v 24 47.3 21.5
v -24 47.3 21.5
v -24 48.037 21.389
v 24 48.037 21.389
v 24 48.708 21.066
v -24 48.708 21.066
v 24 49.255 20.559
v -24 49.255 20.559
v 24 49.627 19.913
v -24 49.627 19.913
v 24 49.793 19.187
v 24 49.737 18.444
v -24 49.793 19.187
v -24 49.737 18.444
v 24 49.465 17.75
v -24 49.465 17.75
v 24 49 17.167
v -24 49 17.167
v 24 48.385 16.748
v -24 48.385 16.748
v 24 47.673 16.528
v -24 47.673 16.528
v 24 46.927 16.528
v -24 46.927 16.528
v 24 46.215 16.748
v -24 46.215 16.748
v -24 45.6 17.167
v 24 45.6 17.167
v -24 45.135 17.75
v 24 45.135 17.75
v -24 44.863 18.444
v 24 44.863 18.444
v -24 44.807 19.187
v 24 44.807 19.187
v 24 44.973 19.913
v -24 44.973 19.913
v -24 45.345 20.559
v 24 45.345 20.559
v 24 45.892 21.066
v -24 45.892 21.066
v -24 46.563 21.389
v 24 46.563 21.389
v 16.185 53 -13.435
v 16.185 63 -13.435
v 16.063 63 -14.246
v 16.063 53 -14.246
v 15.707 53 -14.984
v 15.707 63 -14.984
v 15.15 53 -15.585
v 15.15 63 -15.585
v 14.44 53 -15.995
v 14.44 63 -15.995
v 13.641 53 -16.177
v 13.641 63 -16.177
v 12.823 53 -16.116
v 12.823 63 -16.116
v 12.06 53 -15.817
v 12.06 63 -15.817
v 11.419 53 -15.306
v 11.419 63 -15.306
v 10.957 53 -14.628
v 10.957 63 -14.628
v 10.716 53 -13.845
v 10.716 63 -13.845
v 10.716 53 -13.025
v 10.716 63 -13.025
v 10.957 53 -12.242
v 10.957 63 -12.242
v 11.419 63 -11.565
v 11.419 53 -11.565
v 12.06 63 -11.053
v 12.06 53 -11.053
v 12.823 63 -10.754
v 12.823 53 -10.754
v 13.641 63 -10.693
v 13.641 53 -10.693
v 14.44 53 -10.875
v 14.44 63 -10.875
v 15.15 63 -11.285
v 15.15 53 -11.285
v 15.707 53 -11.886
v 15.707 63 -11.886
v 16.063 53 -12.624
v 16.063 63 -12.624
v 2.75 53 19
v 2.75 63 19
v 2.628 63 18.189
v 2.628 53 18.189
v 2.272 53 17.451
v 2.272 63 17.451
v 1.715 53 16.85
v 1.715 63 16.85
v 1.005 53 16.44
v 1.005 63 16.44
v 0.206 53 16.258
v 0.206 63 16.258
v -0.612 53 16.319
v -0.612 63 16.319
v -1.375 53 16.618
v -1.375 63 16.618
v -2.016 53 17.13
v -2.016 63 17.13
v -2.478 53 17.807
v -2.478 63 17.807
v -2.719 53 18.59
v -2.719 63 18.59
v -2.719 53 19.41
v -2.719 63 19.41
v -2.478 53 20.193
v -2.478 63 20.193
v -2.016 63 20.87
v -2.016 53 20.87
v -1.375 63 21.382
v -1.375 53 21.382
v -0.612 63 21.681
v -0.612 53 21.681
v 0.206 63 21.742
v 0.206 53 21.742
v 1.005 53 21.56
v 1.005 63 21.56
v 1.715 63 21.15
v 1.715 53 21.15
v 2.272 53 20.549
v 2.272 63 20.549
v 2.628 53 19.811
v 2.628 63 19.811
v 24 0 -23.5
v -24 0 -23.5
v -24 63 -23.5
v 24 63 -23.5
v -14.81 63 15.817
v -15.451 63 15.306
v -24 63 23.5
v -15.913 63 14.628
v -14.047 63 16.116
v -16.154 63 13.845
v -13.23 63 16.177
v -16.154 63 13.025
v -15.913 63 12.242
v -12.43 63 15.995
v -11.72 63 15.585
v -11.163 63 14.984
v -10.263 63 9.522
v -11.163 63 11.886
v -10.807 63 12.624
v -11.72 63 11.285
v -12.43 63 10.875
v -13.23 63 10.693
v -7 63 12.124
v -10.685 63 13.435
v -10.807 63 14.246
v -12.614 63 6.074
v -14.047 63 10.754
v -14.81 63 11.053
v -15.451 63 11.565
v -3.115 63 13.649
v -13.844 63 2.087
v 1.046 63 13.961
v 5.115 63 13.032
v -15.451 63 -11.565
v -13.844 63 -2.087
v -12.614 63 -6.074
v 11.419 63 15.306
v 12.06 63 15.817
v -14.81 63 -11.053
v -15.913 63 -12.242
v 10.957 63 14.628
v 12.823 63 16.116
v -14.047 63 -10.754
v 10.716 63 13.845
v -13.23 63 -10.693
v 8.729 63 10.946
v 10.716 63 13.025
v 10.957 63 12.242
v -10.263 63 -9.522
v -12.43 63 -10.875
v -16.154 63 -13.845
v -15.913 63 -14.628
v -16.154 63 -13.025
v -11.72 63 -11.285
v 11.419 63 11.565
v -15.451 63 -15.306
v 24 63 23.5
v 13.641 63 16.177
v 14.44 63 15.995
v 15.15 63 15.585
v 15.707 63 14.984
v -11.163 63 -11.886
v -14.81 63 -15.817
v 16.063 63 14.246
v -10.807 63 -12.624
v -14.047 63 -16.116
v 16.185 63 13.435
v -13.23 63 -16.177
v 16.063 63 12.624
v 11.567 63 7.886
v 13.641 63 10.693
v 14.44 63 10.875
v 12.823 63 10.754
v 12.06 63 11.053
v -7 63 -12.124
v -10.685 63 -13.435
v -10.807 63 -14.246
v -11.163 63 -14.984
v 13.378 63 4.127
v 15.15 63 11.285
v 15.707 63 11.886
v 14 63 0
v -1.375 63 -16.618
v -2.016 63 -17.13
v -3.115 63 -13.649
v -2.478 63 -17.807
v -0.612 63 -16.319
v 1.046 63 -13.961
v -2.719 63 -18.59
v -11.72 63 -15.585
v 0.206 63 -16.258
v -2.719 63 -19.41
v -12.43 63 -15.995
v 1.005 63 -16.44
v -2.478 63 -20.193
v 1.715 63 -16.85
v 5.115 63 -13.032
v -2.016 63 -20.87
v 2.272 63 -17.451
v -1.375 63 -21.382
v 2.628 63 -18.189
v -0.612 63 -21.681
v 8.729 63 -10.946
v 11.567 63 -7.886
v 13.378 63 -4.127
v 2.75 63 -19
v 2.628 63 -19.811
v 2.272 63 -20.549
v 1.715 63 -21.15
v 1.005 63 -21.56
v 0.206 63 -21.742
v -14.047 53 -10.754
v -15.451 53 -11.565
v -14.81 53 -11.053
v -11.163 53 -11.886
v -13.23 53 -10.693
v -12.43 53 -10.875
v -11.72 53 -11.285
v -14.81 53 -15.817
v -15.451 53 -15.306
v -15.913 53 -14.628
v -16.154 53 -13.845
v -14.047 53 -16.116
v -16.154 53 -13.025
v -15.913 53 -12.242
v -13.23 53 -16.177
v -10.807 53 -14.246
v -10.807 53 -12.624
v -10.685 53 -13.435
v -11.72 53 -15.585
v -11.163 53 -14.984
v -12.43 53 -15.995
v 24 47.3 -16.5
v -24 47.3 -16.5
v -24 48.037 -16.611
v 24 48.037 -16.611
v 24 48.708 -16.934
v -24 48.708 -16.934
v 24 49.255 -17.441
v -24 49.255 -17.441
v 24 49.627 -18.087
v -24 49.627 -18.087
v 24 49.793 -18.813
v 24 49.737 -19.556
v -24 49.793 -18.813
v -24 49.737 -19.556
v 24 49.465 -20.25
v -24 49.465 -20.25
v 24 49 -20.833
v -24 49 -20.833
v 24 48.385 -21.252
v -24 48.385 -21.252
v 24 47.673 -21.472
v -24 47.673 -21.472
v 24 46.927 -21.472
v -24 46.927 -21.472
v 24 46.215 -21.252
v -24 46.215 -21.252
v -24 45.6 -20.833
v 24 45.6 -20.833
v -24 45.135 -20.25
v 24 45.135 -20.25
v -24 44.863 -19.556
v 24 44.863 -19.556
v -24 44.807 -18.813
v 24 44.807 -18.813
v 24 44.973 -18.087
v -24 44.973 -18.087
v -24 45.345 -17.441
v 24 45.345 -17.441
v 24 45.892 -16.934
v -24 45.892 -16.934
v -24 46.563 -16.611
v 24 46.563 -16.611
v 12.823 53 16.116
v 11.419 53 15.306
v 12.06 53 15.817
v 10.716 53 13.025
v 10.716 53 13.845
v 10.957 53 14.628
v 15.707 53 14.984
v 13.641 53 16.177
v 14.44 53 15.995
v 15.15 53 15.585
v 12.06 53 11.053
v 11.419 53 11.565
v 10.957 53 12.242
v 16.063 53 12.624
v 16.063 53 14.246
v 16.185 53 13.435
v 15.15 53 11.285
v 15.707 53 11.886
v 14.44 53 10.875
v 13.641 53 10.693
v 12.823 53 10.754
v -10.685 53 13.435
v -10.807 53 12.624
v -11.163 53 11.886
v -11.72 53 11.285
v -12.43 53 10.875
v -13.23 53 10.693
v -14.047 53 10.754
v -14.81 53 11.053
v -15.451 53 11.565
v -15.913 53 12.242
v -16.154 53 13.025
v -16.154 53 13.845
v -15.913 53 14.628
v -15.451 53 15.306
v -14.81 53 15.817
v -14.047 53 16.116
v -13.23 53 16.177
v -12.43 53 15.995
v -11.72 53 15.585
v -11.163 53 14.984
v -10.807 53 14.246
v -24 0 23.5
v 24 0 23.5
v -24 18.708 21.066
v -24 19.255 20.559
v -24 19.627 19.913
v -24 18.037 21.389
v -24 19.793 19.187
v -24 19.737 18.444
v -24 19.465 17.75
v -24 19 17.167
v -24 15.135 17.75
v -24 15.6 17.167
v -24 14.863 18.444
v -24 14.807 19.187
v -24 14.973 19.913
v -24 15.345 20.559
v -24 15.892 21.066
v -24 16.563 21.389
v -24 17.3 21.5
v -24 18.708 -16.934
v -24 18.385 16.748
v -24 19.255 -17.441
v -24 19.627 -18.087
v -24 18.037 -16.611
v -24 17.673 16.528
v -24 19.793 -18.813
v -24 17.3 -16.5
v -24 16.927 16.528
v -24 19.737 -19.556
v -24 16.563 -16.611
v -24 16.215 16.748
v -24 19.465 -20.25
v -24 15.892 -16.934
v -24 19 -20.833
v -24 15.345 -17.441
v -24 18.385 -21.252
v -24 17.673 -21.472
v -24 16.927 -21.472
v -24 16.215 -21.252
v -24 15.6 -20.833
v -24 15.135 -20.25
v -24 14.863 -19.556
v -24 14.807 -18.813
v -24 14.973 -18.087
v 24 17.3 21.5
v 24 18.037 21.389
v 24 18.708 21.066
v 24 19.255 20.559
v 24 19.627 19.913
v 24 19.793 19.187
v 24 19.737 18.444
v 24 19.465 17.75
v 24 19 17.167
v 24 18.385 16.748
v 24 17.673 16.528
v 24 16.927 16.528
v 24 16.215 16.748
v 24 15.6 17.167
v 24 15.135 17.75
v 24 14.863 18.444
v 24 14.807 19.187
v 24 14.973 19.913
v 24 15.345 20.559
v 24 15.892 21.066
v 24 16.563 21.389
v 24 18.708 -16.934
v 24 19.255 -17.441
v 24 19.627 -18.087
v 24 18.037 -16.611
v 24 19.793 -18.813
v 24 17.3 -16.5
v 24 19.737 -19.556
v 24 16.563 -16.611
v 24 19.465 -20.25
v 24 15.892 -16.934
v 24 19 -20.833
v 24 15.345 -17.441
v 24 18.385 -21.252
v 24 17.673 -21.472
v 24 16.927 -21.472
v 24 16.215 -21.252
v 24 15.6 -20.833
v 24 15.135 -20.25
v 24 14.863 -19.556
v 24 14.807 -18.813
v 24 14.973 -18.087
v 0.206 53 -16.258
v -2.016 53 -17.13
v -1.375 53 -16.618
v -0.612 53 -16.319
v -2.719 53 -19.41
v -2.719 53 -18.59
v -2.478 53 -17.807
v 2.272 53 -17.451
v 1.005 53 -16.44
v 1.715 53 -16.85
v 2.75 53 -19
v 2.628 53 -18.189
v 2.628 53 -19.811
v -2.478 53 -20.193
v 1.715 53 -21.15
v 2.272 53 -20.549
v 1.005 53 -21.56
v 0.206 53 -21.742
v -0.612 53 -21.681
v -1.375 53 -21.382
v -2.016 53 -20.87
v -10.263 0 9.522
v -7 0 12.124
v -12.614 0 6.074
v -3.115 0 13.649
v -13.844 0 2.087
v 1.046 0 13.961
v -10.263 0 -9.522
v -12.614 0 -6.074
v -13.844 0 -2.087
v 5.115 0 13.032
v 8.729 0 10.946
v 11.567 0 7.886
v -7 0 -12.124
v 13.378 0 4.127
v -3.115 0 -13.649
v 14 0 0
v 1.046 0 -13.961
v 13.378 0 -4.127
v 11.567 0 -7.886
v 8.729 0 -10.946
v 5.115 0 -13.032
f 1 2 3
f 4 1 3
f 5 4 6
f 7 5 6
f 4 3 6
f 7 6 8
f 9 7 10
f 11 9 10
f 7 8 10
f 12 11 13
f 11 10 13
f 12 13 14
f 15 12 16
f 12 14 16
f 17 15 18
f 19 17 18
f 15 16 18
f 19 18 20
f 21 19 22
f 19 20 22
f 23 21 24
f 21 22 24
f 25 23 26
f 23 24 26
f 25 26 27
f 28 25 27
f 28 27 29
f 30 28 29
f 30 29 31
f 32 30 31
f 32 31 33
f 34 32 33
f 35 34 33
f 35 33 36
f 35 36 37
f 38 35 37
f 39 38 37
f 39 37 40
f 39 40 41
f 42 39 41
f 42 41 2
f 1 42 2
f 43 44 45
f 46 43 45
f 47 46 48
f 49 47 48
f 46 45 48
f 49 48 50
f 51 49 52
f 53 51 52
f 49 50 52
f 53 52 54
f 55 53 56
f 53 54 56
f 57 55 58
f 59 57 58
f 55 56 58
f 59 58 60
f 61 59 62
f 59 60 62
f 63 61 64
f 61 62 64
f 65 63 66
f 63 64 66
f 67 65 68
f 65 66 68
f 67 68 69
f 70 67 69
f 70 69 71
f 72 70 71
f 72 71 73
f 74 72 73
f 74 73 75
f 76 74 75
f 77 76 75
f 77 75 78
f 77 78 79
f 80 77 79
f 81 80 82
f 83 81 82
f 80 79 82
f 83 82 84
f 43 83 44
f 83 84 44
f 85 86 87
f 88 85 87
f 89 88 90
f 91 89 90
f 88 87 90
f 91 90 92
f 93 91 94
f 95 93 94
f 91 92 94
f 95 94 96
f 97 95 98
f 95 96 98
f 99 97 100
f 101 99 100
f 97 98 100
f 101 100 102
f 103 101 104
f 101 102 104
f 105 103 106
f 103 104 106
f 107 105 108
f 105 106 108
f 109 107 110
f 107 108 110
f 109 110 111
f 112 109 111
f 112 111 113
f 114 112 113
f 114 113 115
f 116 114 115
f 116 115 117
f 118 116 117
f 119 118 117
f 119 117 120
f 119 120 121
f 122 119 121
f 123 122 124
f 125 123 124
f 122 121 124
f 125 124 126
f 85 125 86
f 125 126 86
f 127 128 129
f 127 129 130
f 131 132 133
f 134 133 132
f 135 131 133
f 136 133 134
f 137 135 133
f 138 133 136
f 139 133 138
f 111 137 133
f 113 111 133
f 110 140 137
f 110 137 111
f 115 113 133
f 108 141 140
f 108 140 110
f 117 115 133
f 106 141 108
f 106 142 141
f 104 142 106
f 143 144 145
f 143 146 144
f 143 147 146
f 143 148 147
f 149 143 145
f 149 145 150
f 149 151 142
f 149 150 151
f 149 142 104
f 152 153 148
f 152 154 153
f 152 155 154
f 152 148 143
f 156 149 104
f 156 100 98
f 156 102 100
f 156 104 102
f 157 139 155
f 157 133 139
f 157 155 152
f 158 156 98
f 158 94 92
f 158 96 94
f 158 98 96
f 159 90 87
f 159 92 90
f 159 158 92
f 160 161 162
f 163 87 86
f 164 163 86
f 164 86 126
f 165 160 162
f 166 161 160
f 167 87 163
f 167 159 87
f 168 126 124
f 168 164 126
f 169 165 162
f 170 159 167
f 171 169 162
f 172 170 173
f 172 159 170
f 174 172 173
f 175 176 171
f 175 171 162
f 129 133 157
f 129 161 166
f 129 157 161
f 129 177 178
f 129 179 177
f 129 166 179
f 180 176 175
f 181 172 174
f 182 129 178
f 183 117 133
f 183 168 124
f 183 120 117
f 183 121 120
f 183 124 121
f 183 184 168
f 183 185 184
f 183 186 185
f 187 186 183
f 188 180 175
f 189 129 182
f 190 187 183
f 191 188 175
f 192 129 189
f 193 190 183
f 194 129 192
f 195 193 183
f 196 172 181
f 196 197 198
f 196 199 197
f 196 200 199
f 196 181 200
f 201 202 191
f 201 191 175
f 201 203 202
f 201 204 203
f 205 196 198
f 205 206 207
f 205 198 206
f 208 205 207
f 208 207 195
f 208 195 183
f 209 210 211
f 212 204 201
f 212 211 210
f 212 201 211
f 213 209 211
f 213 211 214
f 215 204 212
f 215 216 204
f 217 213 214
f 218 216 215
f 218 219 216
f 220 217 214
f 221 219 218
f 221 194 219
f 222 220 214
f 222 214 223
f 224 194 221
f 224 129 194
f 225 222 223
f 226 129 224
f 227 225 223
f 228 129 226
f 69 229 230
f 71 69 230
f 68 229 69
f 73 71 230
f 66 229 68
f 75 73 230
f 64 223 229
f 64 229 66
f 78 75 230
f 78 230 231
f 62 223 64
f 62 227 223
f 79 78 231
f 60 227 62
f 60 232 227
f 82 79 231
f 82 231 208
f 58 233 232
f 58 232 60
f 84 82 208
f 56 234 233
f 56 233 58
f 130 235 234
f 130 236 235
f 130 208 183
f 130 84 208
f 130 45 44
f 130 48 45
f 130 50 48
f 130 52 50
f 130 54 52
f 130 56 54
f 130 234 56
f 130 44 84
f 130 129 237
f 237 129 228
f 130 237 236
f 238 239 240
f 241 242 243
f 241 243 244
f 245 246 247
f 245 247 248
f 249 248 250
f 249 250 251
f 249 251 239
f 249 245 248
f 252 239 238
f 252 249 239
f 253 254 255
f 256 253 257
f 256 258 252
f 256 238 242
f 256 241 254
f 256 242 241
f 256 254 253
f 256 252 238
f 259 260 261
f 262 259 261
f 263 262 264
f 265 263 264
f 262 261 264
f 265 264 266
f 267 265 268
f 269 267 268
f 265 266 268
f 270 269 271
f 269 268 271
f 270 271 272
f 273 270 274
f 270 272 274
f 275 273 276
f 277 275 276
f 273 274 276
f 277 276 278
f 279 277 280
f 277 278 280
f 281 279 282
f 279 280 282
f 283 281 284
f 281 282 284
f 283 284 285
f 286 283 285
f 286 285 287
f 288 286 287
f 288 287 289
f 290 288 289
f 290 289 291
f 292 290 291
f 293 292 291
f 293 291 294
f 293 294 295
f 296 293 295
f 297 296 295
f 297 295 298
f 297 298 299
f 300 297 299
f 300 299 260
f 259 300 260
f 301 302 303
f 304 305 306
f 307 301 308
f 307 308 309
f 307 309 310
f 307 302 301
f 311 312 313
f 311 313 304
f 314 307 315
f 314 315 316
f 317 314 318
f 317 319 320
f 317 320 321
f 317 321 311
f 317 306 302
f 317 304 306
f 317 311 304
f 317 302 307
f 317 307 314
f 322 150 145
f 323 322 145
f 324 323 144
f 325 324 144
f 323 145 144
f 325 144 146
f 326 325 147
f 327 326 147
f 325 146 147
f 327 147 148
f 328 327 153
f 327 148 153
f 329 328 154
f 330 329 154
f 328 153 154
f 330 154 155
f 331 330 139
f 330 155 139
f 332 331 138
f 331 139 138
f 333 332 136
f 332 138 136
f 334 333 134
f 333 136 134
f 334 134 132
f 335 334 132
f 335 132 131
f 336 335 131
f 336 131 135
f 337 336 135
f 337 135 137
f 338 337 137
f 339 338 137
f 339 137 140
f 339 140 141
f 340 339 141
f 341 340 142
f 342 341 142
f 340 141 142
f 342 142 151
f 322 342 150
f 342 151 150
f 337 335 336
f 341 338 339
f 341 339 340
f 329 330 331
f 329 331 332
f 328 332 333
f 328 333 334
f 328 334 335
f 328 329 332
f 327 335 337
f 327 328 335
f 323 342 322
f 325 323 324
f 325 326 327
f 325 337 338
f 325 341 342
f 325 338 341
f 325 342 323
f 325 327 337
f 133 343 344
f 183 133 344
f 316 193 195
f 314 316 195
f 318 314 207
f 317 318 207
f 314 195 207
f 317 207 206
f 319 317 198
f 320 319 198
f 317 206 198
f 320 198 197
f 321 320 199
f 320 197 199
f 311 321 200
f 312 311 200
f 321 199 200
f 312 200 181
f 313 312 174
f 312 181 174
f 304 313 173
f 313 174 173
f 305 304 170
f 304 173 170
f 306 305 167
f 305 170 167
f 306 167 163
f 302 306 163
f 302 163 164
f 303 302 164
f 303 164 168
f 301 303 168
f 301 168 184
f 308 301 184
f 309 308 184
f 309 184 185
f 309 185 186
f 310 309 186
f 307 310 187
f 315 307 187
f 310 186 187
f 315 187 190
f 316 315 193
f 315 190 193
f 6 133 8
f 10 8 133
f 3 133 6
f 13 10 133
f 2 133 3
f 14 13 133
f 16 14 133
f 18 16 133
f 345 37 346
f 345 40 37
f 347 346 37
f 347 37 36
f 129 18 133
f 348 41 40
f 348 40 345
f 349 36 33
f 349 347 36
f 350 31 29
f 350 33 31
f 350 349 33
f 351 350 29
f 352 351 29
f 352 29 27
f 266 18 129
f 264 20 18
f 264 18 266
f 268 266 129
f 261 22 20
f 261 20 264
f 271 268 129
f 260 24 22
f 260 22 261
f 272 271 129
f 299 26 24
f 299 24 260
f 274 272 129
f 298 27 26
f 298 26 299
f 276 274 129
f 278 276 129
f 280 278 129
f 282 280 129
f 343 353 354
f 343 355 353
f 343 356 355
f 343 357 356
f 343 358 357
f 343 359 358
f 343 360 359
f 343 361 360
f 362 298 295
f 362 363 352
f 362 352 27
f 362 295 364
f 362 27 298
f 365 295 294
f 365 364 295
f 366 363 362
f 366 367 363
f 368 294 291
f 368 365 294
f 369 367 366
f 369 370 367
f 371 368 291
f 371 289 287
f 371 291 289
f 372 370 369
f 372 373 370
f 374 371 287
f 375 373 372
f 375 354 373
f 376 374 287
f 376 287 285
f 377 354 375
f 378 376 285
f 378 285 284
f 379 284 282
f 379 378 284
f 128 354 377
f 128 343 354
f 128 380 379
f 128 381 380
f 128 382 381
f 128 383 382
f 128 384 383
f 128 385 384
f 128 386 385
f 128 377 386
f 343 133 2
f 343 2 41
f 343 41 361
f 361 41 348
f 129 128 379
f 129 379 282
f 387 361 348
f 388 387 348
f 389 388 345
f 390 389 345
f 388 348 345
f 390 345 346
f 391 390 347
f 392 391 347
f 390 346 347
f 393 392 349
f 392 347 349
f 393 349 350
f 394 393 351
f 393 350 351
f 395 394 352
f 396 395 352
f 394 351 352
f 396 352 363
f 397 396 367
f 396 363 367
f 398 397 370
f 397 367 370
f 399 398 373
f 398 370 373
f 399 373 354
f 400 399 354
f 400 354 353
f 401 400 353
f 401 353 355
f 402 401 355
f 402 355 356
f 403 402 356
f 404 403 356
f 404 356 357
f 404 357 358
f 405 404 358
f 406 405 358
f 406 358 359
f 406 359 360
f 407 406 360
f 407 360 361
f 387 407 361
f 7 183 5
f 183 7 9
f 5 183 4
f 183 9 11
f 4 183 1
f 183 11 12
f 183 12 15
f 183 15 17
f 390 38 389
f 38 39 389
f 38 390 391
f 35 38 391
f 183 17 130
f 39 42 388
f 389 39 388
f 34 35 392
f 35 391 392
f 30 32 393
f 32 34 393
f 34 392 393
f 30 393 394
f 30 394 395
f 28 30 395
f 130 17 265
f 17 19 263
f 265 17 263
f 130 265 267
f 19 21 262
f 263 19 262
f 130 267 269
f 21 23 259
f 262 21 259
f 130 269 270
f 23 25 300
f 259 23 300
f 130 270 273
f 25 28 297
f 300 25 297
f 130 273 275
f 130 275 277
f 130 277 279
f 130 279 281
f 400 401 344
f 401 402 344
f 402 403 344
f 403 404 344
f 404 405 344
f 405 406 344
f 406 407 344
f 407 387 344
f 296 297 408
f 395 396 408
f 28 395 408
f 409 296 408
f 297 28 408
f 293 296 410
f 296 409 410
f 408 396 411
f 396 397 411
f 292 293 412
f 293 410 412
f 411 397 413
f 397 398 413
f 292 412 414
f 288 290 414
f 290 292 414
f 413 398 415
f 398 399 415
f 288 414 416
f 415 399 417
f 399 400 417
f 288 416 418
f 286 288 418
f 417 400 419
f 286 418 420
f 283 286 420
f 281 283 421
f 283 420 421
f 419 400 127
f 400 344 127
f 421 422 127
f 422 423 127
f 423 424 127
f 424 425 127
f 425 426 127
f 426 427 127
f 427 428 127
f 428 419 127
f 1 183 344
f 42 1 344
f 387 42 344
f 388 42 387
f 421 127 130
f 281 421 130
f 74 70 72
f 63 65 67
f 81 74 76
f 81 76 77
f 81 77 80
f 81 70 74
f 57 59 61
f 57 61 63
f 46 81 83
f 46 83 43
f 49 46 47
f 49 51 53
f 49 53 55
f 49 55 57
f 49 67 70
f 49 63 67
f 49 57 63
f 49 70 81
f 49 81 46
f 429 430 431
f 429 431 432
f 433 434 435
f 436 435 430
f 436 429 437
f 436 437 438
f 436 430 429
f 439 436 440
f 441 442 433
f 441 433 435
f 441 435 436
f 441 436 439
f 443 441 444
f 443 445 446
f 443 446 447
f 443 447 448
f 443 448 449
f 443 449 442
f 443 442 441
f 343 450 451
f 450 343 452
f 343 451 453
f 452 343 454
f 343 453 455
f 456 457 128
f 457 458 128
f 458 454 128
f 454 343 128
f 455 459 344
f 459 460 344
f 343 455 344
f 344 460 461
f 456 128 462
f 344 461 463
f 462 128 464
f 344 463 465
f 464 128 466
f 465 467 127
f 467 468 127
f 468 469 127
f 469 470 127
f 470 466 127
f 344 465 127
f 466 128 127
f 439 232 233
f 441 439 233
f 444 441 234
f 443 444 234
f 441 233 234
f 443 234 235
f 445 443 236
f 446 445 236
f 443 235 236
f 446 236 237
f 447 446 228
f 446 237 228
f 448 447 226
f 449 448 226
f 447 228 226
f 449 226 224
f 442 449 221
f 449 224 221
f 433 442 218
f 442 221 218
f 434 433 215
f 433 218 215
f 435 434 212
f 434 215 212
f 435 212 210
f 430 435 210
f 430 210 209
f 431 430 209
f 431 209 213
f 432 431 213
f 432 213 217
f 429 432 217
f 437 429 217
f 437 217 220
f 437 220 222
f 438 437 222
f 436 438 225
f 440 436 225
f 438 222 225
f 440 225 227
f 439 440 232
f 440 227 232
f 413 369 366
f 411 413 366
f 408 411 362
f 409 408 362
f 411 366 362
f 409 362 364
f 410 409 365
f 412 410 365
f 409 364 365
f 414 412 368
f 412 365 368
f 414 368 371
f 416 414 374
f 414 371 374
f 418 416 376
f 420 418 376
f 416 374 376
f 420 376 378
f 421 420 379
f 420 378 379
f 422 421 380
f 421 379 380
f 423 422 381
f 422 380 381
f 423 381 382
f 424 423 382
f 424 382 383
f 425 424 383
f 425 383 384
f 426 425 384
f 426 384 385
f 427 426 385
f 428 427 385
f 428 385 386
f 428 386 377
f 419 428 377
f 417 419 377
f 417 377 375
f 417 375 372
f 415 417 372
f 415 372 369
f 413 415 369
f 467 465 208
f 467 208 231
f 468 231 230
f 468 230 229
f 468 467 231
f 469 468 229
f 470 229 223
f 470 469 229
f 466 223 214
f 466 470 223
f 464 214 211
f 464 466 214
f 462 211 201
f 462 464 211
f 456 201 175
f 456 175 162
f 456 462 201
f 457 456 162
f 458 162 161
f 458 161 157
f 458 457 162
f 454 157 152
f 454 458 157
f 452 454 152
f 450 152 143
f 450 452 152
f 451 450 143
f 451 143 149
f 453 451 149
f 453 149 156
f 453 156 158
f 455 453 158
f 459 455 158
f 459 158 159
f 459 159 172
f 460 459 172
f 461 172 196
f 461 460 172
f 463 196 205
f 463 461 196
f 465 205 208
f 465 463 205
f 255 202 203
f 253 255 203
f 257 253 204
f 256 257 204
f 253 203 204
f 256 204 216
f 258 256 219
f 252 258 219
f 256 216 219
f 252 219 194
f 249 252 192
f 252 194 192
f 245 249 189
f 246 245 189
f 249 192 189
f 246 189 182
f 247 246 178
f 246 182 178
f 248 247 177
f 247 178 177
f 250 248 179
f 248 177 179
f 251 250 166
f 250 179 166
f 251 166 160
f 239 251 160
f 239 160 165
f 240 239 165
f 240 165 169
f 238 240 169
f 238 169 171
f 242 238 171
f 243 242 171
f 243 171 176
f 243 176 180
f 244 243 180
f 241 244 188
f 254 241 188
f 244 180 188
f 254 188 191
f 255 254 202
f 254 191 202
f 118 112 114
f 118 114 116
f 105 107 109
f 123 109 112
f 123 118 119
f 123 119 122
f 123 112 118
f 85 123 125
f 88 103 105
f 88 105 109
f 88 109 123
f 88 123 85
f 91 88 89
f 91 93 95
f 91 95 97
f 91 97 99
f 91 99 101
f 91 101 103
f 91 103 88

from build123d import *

# Parameters (mm, degrees)
SKETCH_1_W          = 48
SKETCH_1_H          = 47
SKETCH_1_R          = 14
EXTRUDE_1_DEPTH     = 63
SKETCH_2_R          = 2.5
CUT_EXTRUDE_1_DEPTH = 49
SKETCH_3_R          = 2.75
CUT_EXTRUDE_2_DEPTH = 10


with BuildPart() as part:
    # Эскиз1 → Бобышка-Вытянуть1 (new body)
    with BuildSketch(Plane(origin=(0, 0, 0), x_dir=(1, 0, 0), z_dir=(0, 1, 0))):
        Rectangle(SKETCH_1_W, SKETCH_1_H)
        Circle(SKETCH_1_R, mode=Mode.SUBTRACT)
    extrude(amount=EXTRUDE_1_DEPTH)

    # Эскиз2 → Вырез-Вытянуть1 (cut, through all)
    with BuildSketch(Plane.ZY.offset(24)):
        with Locations((-19.000000006, 47.3)):
            Circle(SKETCH_2_R)
        with Locations((-19.000000006, 17.3)):
            Circle(SKETCH_2_R)
        with Locations((18.999999994, 47.3)):
            Circle(SKETCH_2_R)
        with Locations((18.999999994, 17.3)):
            Circle(SKETCH_2_R)
    extrude(amount=-CUT_EXTRUDE_1_DEPTH, mode=Mode.SUBTRACT)

    # Эскиз3 → Вырез-Вытянуть2 (cut)
    with BuildSketch(Plane(origin=(0, 63, 0), x_dir=(1, 0, 0), z_dir=(0, 1, 0))):
        with Locations((13.435028843, -13.435028842)):
            Circle(SKETCH_3_R)
        with Locations((0, -19)):
            Circle(SKETCH_3_R)
        with Locations((-13.435028842, -13.435028842)):
            Circle(SKETCH_3_R)
        with Locations((13.435028843, 13.435028843)):
            Circle(SKETCH_3_R)
        with Locations((0, 19)):
            Circle(SKETCH_3_R)
        with Locations((-13.435028842, 13.435028843)):
            Circle(SKETCH_3_R)
    extrude(amount=-CUT_EXTRUDE_2_DEPTH, mode=Mode.SUBTRACT)


solid = part.part
